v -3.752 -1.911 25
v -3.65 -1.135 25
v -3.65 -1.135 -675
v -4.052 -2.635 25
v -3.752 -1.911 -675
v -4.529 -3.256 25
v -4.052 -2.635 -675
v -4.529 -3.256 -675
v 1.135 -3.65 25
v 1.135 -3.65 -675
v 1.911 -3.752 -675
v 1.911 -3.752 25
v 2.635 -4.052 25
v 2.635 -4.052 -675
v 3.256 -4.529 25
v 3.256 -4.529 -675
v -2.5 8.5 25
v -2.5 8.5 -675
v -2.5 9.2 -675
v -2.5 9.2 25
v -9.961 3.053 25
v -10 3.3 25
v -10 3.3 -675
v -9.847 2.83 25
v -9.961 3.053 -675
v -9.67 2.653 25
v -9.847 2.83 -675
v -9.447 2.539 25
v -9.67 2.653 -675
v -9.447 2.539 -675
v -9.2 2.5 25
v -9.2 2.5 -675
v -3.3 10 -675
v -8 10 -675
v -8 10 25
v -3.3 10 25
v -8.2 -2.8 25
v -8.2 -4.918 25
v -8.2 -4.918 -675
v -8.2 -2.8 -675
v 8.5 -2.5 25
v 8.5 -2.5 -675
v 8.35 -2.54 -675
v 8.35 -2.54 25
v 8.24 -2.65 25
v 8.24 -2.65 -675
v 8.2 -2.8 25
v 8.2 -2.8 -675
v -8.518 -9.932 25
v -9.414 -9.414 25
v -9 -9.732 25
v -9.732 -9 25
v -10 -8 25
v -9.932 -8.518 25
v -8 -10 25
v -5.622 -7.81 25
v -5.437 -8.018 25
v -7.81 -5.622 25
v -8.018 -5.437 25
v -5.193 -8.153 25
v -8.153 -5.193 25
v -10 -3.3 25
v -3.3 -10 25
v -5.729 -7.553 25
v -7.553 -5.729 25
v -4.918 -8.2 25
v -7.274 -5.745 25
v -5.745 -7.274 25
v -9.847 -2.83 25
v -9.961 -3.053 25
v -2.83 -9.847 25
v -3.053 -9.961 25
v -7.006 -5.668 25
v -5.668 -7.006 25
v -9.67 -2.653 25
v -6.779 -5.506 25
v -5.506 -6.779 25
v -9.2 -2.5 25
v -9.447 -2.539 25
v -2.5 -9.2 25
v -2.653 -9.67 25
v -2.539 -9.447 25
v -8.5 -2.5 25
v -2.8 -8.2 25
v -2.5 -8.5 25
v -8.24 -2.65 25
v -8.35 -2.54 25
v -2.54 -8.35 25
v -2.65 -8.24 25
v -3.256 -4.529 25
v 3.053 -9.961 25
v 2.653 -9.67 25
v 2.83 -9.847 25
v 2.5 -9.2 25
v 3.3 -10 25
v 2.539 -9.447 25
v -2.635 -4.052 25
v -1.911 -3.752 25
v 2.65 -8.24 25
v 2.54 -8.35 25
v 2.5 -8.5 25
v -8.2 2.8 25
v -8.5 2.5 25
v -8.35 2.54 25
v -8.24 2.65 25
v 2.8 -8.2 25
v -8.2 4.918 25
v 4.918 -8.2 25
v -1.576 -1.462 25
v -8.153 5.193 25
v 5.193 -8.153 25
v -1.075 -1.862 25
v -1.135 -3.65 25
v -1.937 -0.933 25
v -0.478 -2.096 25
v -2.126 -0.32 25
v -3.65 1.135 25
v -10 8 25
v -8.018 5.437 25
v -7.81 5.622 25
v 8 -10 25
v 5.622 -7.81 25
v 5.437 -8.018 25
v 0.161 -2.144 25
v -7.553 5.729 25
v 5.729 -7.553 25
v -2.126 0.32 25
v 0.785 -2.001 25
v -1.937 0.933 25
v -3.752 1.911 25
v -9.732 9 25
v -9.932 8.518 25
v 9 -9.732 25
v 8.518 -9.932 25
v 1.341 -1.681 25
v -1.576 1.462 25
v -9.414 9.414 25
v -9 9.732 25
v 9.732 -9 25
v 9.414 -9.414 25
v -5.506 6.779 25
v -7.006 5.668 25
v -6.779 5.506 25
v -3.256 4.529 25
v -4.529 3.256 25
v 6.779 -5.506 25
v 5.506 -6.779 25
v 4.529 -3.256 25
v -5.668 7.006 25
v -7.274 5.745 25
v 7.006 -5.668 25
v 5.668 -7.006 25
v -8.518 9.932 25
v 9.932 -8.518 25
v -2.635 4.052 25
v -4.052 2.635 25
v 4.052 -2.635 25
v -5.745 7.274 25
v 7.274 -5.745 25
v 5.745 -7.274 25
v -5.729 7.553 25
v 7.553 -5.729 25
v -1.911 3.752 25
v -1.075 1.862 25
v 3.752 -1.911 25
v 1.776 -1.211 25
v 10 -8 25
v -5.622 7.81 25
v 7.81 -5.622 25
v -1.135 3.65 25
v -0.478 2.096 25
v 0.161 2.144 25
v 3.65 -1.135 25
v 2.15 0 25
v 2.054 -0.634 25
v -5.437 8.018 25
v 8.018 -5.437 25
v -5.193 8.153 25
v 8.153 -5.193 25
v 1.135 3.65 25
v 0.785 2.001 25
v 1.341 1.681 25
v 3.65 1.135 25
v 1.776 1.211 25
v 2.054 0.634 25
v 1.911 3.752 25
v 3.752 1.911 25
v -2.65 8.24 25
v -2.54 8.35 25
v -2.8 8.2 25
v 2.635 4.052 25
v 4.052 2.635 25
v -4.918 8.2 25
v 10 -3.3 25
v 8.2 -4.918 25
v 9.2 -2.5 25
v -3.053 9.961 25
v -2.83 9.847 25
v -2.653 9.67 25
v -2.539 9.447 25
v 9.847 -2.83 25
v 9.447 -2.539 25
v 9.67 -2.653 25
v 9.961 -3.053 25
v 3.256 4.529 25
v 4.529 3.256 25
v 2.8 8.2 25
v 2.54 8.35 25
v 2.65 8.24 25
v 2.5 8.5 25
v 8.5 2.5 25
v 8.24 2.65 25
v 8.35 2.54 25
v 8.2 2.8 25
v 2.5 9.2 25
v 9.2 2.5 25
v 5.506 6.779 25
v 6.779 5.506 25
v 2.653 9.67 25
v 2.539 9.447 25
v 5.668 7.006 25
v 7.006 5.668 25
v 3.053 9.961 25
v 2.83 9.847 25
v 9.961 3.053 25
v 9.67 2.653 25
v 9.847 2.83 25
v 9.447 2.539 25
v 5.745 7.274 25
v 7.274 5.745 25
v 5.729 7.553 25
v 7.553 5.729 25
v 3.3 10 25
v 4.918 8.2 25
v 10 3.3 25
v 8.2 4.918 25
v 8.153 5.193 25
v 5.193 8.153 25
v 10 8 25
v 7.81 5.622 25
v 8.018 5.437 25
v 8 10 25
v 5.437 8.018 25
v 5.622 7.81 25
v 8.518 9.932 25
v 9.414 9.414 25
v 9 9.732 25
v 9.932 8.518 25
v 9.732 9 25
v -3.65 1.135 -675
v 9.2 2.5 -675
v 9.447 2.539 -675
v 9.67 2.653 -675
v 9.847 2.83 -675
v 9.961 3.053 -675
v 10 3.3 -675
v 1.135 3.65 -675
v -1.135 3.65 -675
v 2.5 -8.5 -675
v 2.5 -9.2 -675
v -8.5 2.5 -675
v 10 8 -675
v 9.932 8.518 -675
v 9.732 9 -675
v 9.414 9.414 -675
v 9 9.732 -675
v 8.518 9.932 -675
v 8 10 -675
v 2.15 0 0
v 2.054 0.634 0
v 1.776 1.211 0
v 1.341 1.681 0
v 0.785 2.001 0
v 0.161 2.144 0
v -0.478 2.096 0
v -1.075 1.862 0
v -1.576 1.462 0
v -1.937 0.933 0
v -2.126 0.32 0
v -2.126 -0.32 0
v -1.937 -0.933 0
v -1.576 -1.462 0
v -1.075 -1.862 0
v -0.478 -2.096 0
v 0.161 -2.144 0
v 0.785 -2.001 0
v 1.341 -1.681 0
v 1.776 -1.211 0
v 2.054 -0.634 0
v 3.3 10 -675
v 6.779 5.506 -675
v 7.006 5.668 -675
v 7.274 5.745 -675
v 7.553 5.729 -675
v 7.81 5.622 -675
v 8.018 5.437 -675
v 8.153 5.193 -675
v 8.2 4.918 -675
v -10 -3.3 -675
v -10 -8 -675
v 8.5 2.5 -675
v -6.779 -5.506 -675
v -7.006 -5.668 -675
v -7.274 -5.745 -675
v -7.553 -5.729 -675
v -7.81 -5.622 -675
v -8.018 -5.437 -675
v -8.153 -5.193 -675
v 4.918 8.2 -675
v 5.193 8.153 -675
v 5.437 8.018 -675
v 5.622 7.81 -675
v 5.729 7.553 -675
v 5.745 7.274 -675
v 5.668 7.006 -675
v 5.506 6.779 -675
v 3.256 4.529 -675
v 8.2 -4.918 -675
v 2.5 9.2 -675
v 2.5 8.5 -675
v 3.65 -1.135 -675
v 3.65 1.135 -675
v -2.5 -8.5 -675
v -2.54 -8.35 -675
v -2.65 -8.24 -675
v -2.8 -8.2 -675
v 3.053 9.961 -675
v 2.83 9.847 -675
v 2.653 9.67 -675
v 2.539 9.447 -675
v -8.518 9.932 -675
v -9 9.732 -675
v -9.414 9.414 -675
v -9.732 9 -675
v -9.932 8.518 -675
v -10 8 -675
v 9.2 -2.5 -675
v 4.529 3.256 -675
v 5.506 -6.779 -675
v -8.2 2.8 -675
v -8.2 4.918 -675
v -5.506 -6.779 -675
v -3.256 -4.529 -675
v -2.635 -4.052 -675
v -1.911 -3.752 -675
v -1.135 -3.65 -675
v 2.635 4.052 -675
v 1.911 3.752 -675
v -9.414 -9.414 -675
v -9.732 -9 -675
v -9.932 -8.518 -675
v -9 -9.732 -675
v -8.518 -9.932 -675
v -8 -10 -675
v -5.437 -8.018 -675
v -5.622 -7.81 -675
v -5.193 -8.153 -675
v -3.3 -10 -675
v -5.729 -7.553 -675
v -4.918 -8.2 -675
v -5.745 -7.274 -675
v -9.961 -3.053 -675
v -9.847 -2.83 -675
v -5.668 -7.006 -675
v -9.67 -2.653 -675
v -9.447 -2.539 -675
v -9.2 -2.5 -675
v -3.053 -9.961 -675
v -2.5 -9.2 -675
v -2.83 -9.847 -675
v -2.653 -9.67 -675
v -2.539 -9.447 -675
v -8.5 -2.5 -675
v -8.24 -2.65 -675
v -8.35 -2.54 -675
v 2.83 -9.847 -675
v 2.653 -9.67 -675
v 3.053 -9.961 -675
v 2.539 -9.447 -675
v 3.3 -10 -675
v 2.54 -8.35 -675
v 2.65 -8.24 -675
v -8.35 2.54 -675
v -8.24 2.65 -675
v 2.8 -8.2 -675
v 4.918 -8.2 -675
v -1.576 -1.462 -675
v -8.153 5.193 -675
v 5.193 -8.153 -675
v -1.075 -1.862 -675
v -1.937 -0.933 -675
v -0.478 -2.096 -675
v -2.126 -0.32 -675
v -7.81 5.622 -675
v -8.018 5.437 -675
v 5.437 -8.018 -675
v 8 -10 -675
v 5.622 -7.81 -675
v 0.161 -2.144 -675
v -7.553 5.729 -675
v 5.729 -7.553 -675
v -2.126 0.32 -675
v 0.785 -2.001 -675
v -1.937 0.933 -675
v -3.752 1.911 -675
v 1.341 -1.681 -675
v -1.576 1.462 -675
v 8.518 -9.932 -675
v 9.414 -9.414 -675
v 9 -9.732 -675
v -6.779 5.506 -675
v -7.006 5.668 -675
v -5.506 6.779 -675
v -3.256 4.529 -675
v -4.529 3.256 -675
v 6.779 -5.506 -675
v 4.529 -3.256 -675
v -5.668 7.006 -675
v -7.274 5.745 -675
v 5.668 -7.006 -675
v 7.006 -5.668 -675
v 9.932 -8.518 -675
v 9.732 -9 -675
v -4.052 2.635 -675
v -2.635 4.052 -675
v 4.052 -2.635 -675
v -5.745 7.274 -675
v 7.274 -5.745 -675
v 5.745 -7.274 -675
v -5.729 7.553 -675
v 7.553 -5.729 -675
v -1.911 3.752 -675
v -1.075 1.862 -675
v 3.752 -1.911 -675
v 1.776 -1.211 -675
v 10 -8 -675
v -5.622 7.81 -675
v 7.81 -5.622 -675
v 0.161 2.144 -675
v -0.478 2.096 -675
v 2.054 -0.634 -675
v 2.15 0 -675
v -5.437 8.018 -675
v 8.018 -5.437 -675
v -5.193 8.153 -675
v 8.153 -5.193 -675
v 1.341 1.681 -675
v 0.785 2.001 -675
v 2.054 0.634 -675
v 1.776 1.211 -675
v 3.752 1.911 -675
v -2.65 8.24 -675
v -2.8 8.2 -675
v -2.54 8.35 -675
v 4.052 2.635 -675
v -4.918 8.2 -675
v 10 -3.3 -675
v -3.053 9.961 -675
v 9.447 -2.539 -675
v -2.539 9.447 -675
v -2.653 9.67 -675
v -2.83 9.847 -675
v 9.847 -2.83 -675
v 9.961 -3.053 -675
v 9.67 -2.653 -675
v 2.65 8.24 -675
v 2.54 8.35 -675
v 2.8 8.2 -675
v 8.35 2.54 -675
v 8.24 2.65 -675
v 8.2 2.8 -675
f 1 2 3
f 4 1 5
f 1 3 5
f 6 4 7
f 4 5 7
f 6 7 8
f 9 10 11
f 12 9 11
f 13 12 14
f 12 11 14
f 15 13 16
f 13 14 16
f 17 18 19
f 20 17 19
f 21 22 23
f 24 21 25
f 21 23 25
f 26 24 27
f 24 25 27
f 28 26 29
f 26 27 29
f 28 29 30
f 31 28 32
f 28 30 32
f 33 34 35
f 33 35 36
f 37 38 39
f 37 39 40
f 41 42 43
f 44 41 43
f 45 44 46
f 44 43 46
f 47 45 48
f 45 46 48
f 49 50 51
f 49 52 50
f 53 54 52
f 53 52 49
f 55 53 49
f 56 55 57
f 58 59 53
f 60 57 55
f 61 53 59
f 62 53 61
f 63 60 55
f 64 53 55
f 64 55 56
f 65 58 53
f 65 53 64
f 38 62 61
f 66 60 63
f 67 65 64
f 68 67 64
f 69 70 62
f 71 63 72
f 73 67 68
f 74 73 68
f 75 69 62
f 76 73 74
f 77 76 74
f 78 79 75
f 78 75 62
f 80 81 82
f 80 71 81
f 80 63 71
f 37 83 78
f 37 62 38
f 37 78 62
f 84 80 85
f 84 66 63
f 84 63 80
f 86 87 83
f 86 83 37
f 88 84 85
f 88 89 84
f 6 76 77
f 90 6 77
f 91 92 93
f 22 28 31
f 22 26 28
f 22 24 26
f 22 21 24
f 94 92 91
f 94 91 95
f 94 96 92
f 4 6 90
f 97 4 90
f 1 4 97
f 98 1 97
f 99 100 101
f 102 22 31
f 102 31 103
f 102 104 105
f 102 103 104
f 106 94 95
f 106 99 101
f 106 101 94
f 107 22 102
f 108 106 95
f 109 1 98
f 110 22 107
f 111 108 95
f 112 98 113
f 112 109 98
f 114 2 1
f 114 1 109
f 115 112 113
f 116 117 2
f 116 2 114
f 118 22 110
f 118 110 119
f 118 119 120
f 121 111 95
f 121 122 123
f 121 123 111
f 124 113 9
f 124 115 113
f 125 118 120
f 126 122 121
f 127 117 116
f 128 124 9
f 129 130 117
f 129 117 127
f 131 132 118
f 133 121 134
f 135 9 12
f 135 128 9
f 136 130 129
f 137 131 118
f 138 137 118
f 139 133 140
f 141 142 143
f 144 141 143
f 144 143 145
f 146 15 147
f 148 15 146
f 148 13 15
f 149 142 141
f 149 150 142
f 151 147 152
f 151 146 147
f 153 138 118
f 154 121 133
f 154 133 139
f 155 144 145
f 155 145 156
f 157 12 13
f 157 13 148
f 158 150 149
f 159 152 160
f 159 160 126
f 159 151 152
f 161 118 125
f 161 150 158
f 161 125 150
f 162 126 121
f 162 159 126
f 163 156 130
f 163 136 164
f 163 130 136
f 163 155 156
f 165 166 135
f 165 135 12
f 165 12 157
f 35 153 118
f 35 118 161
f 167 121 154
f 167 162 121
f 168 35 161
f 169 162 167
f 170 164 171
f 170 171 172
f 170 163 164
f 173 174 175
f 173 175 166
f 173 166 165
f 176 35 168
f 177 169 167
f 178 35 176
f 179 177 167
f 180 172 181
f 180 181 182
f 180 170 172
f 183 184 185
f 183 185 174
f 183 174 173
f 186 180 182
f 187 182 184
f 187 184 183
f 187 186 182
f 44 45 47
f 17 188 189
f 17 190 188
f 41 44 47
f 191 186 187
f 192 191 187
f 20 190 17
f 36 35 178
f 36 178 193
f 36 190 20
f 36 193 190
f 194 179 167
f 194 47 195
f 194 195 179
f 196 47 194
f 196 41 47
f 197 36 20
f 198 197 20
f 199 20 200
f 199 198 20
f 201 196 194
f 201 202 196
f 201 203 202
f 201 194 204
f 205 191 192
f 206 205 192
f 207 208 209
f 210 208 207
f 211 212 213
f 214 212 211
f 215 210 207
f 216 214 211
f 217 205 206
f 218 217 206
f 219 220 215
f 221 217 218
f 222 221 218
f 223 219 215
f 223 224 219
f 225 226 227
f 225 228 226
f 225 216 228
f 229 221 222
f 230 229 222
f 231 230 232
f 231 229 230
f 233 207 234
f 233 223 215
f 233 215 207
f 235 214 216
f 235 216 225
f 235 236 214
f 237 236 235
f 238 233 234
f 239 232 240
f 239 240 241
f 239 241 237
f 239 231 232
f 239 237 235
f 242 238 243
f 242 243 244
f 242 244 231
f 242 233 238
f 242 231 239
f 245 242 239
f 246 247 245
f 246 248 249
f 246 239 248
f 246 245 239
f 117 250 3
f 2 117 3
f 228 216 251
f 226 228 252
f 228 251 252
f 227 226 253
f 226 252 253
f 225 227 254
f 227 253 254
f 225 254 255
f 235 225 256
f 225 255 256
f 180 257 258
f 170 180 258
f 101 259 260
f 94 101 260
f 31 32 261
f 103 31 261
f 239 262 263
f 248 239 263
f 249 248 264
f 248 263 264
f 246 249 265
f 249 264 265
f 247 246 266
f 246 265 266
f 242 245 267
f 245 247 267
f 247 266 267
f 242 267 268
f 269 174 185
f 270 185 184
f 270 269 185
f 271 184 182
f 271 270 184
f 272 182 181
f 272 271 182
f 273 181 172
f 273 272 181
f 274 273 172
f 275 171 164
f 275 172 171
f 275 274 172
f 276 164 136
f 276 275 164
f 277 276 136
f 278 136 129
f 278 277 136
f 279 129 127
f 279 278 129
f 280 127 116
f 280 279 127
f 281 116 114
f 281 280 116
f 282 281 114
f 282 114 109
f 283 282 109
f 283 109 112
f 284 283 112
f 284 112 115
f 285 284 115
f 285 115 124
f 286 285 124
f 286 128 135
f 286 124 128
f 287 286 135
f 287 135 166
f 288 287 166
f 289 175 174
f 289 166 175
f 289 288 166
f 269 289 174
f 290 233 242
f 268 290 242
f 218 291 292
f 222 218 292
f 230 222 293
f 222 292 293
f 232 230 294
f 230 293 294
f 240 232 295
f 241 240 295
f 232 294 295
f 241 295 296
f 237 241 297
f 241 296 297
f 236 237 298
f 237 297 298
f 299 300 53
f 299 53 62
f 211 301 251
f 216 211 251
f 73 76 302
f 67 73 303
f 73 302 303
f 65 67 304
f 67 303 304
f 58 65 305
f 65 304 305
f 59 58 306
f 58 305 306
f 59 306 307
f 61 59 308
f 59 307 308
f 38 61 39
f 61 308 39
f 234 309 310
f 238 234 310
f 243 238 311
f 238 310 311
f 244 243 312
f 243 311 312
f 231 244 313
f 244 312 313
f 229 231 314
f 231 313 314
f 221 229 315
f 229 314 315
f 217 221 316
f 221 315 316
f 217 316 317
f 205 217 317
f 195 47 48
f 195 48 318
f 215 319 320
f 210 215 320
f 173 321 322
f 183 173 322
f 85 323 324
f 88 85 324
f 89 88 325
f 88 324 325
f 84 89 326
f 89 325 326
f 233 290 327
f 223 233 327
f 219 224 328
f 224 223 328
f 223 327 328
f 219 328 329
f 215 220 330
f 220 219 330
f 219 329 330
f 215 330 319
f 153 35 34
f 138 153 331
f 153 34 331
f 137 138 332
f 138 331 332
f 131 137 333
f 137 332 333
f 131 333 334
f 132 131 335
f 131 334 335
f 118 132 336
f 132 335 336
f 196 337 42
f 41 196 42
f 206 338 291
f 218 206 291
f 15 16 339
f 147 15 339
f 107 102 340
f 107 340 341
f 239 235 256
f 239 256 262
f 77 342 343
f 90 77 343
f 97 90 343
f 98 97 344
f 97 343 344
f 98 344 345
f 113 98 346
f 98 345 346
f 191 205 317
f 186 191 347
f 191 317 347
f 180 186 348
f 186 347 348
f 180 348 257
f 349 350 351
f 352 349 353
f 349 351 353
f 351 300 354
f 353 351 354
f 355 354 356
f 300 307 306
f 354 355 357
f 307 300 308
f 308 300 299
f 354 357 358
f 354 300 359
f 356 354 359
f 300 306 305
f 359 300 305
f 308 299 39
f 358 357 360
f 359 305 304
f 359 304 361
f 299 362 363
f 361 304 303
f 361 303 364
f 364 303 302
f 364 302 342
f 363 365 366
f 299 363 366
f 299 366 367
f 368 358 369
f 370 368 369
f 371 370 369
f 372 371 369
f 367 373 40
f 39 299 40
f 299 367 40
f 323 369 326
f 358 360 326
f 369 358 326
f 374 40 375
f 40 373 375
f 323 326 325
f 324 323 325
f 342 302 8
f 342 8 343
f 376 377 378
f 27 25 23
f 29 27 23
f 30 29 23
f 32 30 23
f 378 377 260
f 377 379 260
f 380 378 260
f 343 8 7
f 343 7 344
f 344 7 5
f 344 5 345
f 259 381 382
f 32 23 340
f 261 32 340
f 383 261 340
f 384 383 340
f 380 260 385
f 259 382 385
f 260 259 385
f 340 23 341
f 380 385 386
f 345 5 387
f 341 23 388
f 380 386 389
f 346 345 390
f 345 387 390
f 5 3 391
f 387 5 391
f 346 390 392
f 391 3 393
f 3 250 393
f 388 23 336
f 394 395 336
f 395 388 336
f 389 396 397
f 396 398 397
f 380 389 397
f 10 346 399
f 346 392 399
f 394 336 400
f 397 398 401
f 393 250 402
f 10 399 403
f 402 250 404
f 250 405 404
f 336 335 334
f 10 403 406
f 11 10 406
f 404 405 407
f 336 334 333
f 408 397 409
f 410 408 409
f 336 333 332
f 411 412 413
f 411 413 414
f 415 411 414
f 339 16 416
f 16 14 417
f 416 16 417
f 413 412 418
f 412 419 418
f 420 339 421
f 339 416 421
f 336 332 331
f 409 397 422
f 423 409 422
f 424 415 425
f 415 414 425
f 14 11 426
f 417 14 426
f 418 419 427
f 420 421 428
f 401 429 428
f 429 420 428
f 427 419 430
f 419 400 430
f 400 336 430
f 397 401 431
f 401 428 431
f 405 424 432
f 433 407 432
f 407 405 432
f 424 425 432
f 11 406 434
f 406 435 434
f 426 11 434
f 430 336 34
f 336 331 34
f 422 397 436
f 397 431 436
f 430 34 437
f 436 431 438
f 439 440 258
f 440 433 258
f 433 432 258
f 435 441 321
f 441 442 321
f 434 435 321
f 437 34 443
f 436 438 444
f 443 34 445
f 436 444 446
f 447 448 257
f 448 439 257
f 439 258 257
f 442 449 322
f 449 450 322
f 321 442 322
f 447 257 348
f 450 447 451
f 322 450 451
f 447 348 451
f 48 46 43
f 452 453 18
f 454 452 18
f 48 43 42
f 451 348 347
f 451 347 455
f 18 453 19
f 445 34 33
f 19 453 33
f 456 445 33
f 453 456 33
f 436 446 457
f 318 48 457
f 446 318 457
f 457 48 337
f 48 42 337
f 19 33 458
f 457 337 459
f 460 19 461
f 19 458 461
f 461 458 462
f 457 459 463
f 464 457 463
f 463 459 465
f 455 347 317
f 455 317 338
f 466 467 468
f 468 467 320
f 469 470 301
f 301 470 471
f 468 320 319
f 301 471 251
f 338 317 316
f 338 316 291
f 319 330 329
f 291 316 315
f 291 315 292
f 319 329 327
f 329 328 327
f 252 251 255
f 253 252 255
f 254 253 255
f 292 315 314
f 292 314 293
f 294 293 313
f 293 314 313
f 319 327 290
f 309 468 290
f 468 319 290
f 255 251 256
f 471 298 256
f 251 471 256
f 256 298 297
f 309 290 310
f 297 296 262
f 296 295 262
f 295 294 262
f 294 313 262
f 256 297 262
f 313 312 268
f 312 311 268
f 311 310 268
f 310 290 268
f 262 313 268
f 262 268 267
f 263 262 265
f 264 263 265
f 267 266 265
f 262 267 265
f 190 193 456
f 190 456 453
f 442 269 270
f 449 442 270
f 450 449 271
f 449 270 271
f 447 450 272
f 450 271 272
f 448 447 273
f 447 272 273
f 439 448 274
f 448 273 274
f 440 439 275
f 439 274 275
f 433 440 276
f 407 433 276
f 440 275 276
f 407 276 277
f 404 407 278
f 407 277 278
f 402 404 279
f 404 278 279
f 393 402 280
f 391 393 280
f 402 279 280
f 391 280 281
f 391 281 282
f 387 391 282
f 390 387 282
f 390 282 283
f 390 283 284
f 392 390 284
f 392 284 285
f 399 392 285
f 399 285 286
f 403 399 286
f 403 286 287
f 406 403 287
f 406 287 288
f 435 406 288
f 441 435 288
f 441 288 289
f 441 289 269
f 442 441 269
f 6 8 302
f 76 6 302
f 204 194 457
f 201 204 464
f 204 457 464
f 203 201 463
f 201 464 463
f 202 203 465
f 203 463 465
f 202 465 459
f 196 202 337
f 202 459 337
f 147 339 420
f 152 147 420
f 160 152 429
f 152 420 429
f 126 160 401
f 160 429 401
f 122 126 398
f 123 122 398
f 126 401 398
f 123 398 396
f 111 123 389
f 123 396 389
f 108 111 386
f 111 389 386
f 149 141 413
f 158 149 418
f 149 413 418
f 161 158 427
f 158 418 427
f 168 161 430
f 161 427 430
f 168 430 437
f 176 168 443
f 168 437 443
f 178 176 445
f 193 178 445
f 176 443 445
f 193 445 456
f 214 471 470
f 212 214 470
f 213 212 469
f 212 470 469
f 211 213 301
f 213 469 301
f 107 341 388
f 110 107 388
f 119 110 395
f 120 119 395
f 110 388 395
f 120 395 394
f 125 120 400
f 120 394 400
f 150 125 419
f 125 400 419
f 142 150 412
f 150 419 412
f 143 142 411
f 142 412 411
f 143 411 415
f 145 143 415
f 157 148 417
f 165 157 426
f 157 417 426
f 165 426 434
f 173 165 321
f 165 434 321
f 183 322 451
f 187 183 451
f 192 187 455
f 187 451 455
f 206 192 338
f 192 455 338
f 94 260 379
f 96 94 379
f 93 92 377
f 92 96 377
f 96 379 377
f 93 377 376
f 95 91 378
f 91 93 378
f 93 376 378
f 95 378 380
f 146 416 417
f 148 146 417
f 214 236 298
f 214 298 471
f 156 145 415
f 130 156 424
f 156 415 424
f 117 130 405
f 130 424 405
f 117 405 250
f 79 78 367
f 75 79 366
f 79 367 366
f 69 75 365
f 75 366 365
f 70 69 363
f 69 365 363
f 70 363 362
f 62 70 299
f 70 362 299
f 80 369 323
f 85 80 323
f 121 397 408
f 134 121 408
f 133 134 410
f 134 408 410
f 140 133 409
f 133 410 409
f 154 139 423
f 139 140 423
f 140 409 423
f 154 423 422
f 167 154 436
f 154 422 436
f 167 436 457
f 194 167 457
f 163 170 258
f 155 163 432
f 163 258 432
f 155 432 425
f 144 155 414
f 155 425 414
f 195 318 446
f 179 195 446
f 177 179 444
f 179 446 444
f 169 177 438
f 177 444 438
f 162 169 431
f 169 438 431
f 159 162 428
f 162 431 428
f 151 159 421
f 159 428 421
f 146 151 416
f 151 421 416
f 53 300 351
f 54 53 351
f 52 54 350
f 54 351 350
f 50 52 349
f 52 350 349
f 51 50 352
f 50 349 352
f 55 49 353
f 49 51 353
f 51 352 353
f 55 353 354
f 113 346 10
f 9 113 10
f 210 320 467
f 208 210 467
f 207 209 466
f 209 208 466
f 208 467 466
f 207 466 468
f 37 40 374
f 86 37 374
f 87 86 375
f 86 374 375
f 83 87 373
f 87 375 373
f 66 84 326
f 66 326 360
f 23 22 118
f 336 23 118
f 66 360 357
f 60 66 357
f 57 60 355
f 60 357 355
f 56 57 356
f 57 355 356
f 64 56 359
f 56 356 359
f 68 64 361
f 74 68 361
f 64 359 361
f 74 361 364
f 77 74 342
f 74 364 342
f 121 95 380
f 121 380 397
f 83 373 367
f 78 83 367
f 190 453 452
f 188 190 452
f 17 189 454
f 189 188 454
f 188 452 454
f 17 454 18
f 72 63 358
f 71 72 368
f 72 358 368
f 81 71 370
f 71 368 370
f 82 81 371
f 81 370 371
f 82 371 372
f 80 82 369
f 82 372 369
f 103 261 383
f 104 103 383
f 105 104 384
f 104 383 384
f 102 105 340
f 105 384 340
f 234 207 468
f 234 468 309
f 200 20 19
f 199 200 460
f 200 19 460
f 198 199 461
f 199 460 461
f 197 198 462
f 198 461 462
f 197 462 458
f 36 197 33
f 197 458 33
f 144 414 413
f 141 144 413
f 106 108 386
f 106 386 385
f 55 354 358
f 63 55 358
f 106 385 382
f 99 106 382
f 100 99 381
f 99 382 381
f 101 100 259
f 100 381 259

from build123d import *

# Parameters (mm, degrees)
SKETCH4_W              = 20
SKETCH4_H              = 20
BODY_DEPTH             = 700
SKETCH16_OUTSIDE_W     = 162.114
SKETCH16_OUTSIDE_H     = 162.114
SKETCH16_OUTSIDE_R     = 2.15
CUT_PROFILE_DEPTH      = 26
CUT_PROFILE_DEPTH_BACK = 676


with BuildPart() as part:
    # Sketch4 → Body (new body)
    with BuildSketch(Plane.XY.offset(25)):
        Rectangle(SKETCH4_W, SKETCH4_H)
    extrude(amount=-BODY_DEPTH)

    # Sketch16 outside → Cut-Profile (cut, two sides)
    with BuildSketch(Plane.XY) as cut_profile_sk:
        Rectangle(SKETCH16_OUTSIDE_W, SKETCH16_OUTSIDE_H)
        with BuildLine():
            Line((4.917588389, -8.199999991), (2.799999989, -8.199999991))
            ThreePointArc((2.799999989, -8.199999991), (2.587867955, -8.287867957), (2.499999989, -8.499999991))
            Line((2.499999989, -8.499999991), (2.499999989, -9.199999991))
            ThreePointArc((2.499999989, -9.199999991), (2.734314564, -9.765685416), (3.299999989, -9.999999991))
            Line((3.299999989, -9.999999991), (7.999999989, -9.999999991))
            ThreePointArc((7.999999989, -9.999999991), (9.414213552, -9.414213554), (9.999999989, -7.999999991))
            Line((9.999999989, -7.999999991), (9.999999989, -3.299999991))
            ThreePointArc((9.999999989, -3.299999991), (9.765685414, -2.734314566), (9.199999989, -2.499999991))
            Line((9.199999989, -2.499999991), (8.499999989, -2.499999991))
            ThreePointArc((8.499999989, -2.499999991), (8.287867955, -2.587867957), (8.199999989, -2.799999991))
            Line((8.199999989, -2.799999991), (8.199999989, -4.917588391))
            ThreePointArc((8.199999989, -4.917588391), (7.686138511, -5.686636441), (6.778984485, -5.506192286))
            Line((6.778984485, -5.506192286), (4.528679645, -3.255887446))
            ThreePointArc((4.528679645, -3.255887446), (3.878361392, -2.282617401), (3.64999999, -1.134567106))
            Line((3.64999999, -1.134567106), (3.64999999, 1.134567104))
            ThreePointArc((3.64999999, 1.134567104), (3.878361393, 2.282617402), (4.528679647, 3.255887448))
            Line((4.528679647, 3.255887448), (6.778984487, 5.506192288))
            ThreePointArc((6.778984487, 5.506192288), (7.686138506, 5.686636442), (8.199999981, 4.917588398))
            Line((8.199999981, 4.917588398), (8.199999981, 2.799999998))
            ThreePointArc((8.199999981, 2.799999998), (8.287867946, 2.587867964), (8.499999981, 2.499999998))
            Line((8.499999981, 2.499999998), (9.199999981, 2.499999998))
            ThreePointArc((9.199999981, 2.499999998), (9.765685406, 2.734314573), (9.999999981, 3.299999998))
            Line((9.999999981, 3.299999998), (9.999999981, 7.999999998))
            ThreePointArc((9.999999981, 7.999999998), (9.414213543, 9.41421356), (7.999999981, 9.999999998))
            Line((7.999999981, 9.999999998), (3.299999981, 9.999999998))
            ThreePointArc((3.299999981, 9.999999998), (2.734314556, 9.765685423), (2.499999981, 9.199999998))
            Line((2.499999981, 9.199999998), (2.499999981, 8.499999998))
            ThreePointArc((2.499999981, 8.499999998), (2.587867946, 8.287867964), (2.799999981, 8.199999998))
            Line((2.799999981, 8.199999998), (4.917588381, 8.199999998))
            ThreePointArc((4.917588381, 8.199999998), (5.68663643, 7.68613852), (5.506192275, 6.778984494))
            Line((5.506192275, 6.778984494), (3.255887435, 4.528679654))
            ThreePointArc((3.255887435, 4.528679654), (2.28261739, 3.878361401), (1.134567095, 3.649999999))
            Line((1.134567095, 3.649999999), (-1.134567115, 3.649999999))
            ThreePointArc((-1.134567115, 3.649999999), (-2.282617412, 3.878361401), (-3.255887459, 4.528679655))
            Line((-3.255887459, 4.528679655), (-5.506192299, 6.778984495))
            ThreePointArc((-5.506192299, 6.778984495), (-5.686636452, 7.686138515), (-4.917588409, 8.199999989))
            Line((-4.917588409, 8.199999989), (-2.800000009, 8.199999989))
            ThreePointArc((-2.800000009, 8.199999989), (-2.587867974, 8.287867955), (-2.500000009, 8.499999989))
            Line((-2.500000009, 8.499999989), (-2.500000009, 9.199999989))
            ThreePointArc((-2.500000009, 9.199999989), (-2.734314584, 9.765685414), (-3.300000009, 9.999999989))
            Line((-3.300000009, 9.999999989), (-8.000000009, 9.999999989))
            ThreePointArc((-8.000000009, 9.999999989), (-9.414213571, 9.414213552), (-10.000000009, 7.999999989))
            Line((-10.000000009, 7.999999989), (-10.000000009, 3.299999989))
            ThreePointArc((-10.000000009, 3.299999989), (-9.765685434, 2.734314564), (-9.200000009, 2.499999989))
            Line((-9.200000009, 2.499999989), (-8.500000009, 2.499999989))
            ThreePointArc((-8.500000009, 2.499999989), (-8.287867974, 2.587867955), (-8.200000009, 2.799999989))
            Line((-8.200000009, 2.799999989), (-8.200000009, 4.917588389))
            ThreePointArc((-8.200000009, 4.917588389), (-7.686138531, 5.686636438), (-6.778984504, 5.506192284))
            Line((-6.778984504, 5.506192284), (-4.528679664, 3.255887444))
            ThreePointArc((-4.528679664, 3.255887444), (-3.878361412, 2.282617399), (-3.650000009, 1.134567104))
            Line((-3.650000009, 1.134567104), (-3.650000009, -1.134567106))
            ThreePointArc((-3.650000009, -1.134567106), (-3.878361412, -2.282617404), (-4.528679666, -3.25588745))
            Line((-4.528679666, -3.25588745), (-6.778984506, -5.50619229))
            ThreePointArc((-6.778984506, -5.50619229), (-7.686138526, -5.686636444), (-8.2, -4.9175884))
            Line((-8.2, -4.9175884), (-8.2, -2.8))
            ThreePointArc((-8.2, -2.8), (-8.287867966, -2.587867966), (-8.5, -2.5))
            Line((-8.5, -2.5), (-9.2, -2.5))
            ThreePointArc((-9.2, -2.5), (-9.765685425, -2.734314575), (-10, -3.3))
            Line((-10, -3.3), (-10, -8))
            ThreePointArc((-10, -8), (-9.414213562, -9.414213562), (-8, -10))
            Line((-8, -10), (-3.3, -10))
            ThreePointArc((-3.3, -10), (-2.734314575, -9.765685425), (-2.5, -9.2))
            Line((-2.5, -9.2), (-2.5, -8.5))
            ThreePointArc((-2.5, -8.5), (-2.587867966, -8.287867966), (-2.8, -8.2))
            Line((-2.8, -8.2), (-4.9175884, -8.2))
            ThreePointArc((-4.9175884, -8.2), (-5.686636449, -7.686138522), (-5.506192294, -6.778984496))
            Line((-5.506192294, -6.778984496), (-3.255887454, -4.528679656))
            ThreePointArc((-3.255887454, -4.528679656), (-2.282617409, -3.878361403), (-1.134567114, -3.650000001))
            Line((-1.134567114, -3.650000001), (1.134567096, -3.650000001))
            ThreePointArc((1.134567096, -3.650000001), (2.282617393, -3.878361403), (3.255887439, -4.528679657))
            Line((3.255887439, -4.528679657), (5.506192279, -6.778984497))
            ThreePointArc((5.506192279, -6.778984497), (5.686636433, -7.686138517), (4.917588389, -8.199999991))
        make_face(mode=Mode.SUBTRACT)
        Circle(SKETCH16_OUTSIDE_R)
    extrude(amount=CUT_PROFILE_DEPTH, mode=Mode.SUBTRACT)
    extrude(cut_profile_sk.sketch, amount=-CUT_PROFILE_DEPTH_BACK, mode=Mode.SUBTRACT)


solid = part.part
